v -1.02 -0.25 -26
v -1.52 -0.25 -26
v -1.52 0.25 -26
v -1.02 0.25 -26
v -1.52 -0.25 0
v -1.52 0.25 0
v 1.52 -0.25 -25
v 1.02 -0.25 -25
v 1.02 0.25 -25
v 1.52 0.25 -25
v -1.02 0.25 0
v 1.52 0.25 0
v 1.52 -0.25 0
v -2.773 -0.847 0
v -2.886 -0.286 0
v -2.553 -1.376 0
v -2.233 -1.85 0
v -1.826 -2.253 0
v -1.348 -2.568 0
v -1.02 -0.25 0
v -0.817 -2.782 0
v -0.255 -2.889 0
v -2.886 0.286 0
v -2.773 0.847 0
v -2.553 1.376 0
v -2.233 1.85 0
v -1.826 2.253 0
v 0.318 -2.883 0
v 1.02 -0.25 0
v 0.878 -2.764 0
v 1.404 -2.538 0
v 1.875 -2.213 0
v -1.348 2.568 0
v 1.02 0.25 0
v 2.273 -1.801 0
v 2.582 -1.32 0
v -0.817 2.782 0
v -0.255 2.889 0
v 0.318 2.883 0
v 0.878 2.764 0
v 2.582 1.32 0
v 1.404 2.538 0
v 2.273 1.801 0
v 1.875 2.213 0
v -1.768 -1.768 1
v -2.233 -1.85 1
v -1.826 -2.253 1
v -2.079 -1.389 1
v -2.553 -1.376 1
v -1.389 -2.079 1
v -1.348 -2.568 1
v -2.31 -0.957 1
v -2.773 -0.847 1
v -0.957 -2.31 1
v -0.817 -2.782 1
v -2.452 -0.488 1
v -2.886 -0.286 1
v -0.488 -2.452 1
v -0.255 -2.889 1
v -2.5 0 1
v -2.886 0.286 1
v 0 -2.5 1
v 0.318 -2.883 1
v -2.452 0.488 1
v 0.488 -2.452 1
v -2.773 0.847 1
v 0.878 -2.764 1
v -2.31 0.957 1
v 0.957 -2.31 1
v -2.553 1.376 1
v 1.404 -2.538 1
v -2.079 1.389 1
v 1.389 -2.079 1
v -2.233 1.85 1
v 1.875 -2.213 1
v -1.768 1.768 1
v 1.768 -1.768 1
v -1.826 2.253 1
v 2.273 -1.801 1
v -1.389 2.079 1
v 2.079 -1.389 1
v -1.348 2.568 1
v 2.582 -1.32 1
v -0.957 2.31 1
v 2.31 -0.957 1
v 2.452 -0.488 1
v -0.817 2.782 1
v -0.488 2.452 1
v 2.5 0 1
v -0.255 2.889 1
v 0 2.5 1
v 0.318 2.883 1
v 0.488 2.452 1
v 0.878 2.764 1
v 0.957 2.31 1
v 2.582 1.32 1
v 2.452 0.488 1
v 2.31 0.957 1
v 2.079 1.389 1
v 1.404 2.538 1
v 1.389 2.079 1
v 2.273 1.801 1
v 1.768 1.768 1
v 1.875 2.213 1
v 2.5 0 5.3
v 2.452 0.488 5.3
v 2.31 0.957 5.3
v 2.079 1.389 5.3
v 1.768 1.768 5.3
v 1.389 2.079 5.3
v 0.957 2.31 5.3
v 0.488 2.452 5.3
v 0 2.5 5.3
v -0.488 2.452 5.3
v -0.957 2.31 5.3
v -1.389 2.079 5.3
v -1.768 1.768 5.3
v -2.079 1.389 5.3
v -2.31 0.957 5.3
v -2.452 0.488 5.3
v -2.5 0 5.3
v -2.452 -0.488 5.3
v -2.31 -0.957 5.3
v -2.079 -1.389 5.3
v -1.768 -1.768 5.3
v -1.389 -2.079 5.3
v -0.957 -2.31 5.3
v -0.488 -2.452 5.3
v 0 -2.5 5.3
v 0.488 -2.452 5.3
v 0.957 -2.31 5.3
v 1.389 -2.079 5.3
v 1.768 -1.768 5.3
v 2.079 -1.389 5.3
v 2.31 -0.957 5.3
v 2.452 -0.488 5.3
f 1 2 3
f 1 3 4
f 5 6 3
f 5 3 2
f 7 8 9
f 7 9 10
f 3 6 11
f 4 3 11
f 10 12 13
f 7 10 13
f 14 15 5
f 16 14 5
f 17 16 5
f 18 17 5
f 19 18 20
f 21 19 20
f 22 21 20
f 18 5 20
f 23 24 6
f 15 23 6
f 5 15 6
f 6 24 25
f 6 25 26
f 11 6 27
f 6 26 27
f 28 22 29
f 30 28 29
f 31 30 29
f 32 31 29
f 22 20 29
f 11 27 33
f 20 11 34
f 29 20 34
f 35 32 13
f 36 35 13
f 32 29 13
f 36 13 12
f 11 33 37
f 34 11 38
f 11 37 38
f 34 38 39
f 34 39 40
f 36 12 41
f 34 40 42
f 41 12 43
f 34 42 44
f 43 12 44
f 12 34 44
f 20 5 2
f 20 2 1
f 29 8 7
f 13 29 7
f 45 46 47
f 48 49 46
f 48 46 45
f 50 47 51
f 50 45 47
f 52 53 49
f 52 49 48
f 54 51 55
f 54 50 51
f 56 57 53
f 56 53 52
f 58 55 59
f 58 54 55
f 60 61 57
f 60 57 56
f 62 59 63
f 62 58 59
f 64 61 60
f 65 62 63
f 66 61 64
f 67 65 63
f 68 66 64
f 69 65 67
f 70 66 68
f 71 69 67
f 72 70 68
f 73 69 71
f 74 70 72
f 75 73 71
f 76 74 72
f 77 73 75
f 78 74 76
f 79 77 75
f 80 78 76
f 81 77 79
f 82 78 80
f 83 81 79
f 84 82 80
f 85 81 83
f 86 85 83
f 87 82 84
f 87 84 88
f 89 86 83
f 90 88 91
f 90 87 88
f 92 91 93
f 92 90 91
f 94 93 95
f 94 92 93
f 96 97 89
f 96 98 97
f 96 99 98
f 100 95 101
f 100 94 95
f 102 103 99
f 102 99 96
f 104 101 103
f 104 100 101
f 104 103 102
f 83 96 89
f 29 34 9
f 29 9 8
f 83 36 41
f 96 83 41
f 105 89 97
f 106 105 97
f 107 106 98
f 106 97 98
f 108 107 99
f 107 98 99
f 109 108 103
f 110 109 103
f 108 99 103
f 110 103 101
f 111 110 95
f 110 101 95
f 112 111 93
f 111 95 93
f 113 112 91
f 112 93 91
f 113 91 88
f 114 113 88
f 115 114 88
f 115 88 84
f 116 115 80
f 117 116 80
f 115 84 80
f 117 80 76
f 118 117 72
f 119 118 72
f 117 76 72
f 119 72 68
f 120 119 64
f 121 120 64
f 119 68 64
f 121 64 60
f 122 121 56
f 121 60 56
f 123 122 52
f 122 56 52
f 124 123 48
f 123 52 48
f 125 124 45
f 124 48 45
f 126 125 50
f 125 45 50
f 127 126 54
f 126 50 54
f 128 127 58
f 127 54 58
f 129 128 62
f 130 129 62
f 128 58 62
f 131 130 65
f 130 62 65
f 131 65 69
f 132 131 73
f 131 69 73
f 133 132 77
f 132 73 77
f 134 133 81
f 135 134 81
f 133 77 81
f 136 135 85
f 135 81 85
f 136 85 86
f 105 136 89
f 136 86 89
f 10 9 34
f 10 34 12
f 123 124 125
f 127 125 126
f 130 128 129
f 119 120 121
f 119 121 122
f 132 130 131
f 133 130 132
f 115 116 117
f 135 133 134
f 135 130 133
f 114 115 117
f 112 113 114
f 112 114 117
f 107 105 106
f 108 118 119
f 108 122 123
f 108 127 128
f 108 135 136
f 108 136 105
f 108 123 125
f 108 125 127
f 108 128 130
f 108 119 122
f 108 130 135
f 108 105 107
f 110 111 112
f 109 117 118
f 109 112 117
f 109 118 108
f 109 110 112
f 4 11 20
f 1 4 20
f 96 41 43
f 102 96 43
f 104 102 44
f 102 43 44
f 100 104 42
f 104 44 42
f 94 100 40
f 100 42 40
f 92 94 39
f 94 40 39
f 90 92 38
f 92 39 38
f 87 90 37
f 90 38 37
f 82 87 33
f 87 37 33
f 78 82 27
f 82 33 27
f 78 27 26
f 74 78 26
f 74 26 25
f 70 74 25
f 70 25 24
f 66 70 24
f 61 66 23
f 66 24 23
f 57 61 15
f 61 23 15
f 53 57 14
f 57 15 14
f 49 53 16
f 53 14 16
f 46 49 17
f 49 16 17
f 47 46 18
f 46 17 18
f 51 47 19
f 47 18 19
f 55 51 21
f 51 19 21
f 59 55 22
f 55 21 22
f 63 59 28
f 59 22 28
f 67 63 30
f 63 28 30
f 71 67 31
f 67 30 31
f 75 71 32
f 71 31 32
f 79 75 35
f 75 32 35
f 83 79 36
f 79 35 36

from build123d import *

# Parameters (mm, degrees)
PAD_DEPTH    = 1
SKETCH001_R  = 2.5
PAD001_DEPTH = 4.3
SKETCH002_W  = 0.5
SKETCH002_H  = 0.5
PAD002_DEPTH = 26
SKETCH003_W  = 0.5
SKETCH003_H  = 0.5
PAD003_DEPTH = 25


with BuildPart() as part:
    # Sketch → Pad (new body)
    with BuildSketch(Plane.XY):
        with BuildLine():
            ThreePointArc((2.58229, 1.319765), (-2.9, 0), (2.58229, -1.319765))
            Line((2.58229, -1.319765), (2.58229, 1.319765))
        make_face()
    extrude(amount=PAD_DEPTH)

    # Sketch001 (on Face4 of Pad) → Pad001 (join)
    with BuildSketch(Plane.XY.offset(1)):
        Circle(SKETCH001_R)
    extrude(amount=PAD001_DEPTH)

    # Sketch002 (on Face3 of Pad001) → Pad002 (join)
    with BuildSketch(Plane(origin=(0, 0, 0), x_dir=(1, 0, 0), z_dir=(0, 0, -1))):
        with Locations((-1.27, 0)):
            Rectangle(SKETCH002_W, SKETCH002_H)
    extrude(amount=PAD002_DEPTH)

    # Sketch003 (on Face3 of Pad002) → Pad003 (join)
    with BuildSketch(Plane(origin=(0, 0, 0), x_dir=(1, 0, 0), z_dir=(0, 0, -1))):
        with Locations((1.27, 0)):
            Rectangle(SKETCH003_W, SKETCH003_H)
    extrude(amount=PAD003_DEPTH)


solid = part.part
